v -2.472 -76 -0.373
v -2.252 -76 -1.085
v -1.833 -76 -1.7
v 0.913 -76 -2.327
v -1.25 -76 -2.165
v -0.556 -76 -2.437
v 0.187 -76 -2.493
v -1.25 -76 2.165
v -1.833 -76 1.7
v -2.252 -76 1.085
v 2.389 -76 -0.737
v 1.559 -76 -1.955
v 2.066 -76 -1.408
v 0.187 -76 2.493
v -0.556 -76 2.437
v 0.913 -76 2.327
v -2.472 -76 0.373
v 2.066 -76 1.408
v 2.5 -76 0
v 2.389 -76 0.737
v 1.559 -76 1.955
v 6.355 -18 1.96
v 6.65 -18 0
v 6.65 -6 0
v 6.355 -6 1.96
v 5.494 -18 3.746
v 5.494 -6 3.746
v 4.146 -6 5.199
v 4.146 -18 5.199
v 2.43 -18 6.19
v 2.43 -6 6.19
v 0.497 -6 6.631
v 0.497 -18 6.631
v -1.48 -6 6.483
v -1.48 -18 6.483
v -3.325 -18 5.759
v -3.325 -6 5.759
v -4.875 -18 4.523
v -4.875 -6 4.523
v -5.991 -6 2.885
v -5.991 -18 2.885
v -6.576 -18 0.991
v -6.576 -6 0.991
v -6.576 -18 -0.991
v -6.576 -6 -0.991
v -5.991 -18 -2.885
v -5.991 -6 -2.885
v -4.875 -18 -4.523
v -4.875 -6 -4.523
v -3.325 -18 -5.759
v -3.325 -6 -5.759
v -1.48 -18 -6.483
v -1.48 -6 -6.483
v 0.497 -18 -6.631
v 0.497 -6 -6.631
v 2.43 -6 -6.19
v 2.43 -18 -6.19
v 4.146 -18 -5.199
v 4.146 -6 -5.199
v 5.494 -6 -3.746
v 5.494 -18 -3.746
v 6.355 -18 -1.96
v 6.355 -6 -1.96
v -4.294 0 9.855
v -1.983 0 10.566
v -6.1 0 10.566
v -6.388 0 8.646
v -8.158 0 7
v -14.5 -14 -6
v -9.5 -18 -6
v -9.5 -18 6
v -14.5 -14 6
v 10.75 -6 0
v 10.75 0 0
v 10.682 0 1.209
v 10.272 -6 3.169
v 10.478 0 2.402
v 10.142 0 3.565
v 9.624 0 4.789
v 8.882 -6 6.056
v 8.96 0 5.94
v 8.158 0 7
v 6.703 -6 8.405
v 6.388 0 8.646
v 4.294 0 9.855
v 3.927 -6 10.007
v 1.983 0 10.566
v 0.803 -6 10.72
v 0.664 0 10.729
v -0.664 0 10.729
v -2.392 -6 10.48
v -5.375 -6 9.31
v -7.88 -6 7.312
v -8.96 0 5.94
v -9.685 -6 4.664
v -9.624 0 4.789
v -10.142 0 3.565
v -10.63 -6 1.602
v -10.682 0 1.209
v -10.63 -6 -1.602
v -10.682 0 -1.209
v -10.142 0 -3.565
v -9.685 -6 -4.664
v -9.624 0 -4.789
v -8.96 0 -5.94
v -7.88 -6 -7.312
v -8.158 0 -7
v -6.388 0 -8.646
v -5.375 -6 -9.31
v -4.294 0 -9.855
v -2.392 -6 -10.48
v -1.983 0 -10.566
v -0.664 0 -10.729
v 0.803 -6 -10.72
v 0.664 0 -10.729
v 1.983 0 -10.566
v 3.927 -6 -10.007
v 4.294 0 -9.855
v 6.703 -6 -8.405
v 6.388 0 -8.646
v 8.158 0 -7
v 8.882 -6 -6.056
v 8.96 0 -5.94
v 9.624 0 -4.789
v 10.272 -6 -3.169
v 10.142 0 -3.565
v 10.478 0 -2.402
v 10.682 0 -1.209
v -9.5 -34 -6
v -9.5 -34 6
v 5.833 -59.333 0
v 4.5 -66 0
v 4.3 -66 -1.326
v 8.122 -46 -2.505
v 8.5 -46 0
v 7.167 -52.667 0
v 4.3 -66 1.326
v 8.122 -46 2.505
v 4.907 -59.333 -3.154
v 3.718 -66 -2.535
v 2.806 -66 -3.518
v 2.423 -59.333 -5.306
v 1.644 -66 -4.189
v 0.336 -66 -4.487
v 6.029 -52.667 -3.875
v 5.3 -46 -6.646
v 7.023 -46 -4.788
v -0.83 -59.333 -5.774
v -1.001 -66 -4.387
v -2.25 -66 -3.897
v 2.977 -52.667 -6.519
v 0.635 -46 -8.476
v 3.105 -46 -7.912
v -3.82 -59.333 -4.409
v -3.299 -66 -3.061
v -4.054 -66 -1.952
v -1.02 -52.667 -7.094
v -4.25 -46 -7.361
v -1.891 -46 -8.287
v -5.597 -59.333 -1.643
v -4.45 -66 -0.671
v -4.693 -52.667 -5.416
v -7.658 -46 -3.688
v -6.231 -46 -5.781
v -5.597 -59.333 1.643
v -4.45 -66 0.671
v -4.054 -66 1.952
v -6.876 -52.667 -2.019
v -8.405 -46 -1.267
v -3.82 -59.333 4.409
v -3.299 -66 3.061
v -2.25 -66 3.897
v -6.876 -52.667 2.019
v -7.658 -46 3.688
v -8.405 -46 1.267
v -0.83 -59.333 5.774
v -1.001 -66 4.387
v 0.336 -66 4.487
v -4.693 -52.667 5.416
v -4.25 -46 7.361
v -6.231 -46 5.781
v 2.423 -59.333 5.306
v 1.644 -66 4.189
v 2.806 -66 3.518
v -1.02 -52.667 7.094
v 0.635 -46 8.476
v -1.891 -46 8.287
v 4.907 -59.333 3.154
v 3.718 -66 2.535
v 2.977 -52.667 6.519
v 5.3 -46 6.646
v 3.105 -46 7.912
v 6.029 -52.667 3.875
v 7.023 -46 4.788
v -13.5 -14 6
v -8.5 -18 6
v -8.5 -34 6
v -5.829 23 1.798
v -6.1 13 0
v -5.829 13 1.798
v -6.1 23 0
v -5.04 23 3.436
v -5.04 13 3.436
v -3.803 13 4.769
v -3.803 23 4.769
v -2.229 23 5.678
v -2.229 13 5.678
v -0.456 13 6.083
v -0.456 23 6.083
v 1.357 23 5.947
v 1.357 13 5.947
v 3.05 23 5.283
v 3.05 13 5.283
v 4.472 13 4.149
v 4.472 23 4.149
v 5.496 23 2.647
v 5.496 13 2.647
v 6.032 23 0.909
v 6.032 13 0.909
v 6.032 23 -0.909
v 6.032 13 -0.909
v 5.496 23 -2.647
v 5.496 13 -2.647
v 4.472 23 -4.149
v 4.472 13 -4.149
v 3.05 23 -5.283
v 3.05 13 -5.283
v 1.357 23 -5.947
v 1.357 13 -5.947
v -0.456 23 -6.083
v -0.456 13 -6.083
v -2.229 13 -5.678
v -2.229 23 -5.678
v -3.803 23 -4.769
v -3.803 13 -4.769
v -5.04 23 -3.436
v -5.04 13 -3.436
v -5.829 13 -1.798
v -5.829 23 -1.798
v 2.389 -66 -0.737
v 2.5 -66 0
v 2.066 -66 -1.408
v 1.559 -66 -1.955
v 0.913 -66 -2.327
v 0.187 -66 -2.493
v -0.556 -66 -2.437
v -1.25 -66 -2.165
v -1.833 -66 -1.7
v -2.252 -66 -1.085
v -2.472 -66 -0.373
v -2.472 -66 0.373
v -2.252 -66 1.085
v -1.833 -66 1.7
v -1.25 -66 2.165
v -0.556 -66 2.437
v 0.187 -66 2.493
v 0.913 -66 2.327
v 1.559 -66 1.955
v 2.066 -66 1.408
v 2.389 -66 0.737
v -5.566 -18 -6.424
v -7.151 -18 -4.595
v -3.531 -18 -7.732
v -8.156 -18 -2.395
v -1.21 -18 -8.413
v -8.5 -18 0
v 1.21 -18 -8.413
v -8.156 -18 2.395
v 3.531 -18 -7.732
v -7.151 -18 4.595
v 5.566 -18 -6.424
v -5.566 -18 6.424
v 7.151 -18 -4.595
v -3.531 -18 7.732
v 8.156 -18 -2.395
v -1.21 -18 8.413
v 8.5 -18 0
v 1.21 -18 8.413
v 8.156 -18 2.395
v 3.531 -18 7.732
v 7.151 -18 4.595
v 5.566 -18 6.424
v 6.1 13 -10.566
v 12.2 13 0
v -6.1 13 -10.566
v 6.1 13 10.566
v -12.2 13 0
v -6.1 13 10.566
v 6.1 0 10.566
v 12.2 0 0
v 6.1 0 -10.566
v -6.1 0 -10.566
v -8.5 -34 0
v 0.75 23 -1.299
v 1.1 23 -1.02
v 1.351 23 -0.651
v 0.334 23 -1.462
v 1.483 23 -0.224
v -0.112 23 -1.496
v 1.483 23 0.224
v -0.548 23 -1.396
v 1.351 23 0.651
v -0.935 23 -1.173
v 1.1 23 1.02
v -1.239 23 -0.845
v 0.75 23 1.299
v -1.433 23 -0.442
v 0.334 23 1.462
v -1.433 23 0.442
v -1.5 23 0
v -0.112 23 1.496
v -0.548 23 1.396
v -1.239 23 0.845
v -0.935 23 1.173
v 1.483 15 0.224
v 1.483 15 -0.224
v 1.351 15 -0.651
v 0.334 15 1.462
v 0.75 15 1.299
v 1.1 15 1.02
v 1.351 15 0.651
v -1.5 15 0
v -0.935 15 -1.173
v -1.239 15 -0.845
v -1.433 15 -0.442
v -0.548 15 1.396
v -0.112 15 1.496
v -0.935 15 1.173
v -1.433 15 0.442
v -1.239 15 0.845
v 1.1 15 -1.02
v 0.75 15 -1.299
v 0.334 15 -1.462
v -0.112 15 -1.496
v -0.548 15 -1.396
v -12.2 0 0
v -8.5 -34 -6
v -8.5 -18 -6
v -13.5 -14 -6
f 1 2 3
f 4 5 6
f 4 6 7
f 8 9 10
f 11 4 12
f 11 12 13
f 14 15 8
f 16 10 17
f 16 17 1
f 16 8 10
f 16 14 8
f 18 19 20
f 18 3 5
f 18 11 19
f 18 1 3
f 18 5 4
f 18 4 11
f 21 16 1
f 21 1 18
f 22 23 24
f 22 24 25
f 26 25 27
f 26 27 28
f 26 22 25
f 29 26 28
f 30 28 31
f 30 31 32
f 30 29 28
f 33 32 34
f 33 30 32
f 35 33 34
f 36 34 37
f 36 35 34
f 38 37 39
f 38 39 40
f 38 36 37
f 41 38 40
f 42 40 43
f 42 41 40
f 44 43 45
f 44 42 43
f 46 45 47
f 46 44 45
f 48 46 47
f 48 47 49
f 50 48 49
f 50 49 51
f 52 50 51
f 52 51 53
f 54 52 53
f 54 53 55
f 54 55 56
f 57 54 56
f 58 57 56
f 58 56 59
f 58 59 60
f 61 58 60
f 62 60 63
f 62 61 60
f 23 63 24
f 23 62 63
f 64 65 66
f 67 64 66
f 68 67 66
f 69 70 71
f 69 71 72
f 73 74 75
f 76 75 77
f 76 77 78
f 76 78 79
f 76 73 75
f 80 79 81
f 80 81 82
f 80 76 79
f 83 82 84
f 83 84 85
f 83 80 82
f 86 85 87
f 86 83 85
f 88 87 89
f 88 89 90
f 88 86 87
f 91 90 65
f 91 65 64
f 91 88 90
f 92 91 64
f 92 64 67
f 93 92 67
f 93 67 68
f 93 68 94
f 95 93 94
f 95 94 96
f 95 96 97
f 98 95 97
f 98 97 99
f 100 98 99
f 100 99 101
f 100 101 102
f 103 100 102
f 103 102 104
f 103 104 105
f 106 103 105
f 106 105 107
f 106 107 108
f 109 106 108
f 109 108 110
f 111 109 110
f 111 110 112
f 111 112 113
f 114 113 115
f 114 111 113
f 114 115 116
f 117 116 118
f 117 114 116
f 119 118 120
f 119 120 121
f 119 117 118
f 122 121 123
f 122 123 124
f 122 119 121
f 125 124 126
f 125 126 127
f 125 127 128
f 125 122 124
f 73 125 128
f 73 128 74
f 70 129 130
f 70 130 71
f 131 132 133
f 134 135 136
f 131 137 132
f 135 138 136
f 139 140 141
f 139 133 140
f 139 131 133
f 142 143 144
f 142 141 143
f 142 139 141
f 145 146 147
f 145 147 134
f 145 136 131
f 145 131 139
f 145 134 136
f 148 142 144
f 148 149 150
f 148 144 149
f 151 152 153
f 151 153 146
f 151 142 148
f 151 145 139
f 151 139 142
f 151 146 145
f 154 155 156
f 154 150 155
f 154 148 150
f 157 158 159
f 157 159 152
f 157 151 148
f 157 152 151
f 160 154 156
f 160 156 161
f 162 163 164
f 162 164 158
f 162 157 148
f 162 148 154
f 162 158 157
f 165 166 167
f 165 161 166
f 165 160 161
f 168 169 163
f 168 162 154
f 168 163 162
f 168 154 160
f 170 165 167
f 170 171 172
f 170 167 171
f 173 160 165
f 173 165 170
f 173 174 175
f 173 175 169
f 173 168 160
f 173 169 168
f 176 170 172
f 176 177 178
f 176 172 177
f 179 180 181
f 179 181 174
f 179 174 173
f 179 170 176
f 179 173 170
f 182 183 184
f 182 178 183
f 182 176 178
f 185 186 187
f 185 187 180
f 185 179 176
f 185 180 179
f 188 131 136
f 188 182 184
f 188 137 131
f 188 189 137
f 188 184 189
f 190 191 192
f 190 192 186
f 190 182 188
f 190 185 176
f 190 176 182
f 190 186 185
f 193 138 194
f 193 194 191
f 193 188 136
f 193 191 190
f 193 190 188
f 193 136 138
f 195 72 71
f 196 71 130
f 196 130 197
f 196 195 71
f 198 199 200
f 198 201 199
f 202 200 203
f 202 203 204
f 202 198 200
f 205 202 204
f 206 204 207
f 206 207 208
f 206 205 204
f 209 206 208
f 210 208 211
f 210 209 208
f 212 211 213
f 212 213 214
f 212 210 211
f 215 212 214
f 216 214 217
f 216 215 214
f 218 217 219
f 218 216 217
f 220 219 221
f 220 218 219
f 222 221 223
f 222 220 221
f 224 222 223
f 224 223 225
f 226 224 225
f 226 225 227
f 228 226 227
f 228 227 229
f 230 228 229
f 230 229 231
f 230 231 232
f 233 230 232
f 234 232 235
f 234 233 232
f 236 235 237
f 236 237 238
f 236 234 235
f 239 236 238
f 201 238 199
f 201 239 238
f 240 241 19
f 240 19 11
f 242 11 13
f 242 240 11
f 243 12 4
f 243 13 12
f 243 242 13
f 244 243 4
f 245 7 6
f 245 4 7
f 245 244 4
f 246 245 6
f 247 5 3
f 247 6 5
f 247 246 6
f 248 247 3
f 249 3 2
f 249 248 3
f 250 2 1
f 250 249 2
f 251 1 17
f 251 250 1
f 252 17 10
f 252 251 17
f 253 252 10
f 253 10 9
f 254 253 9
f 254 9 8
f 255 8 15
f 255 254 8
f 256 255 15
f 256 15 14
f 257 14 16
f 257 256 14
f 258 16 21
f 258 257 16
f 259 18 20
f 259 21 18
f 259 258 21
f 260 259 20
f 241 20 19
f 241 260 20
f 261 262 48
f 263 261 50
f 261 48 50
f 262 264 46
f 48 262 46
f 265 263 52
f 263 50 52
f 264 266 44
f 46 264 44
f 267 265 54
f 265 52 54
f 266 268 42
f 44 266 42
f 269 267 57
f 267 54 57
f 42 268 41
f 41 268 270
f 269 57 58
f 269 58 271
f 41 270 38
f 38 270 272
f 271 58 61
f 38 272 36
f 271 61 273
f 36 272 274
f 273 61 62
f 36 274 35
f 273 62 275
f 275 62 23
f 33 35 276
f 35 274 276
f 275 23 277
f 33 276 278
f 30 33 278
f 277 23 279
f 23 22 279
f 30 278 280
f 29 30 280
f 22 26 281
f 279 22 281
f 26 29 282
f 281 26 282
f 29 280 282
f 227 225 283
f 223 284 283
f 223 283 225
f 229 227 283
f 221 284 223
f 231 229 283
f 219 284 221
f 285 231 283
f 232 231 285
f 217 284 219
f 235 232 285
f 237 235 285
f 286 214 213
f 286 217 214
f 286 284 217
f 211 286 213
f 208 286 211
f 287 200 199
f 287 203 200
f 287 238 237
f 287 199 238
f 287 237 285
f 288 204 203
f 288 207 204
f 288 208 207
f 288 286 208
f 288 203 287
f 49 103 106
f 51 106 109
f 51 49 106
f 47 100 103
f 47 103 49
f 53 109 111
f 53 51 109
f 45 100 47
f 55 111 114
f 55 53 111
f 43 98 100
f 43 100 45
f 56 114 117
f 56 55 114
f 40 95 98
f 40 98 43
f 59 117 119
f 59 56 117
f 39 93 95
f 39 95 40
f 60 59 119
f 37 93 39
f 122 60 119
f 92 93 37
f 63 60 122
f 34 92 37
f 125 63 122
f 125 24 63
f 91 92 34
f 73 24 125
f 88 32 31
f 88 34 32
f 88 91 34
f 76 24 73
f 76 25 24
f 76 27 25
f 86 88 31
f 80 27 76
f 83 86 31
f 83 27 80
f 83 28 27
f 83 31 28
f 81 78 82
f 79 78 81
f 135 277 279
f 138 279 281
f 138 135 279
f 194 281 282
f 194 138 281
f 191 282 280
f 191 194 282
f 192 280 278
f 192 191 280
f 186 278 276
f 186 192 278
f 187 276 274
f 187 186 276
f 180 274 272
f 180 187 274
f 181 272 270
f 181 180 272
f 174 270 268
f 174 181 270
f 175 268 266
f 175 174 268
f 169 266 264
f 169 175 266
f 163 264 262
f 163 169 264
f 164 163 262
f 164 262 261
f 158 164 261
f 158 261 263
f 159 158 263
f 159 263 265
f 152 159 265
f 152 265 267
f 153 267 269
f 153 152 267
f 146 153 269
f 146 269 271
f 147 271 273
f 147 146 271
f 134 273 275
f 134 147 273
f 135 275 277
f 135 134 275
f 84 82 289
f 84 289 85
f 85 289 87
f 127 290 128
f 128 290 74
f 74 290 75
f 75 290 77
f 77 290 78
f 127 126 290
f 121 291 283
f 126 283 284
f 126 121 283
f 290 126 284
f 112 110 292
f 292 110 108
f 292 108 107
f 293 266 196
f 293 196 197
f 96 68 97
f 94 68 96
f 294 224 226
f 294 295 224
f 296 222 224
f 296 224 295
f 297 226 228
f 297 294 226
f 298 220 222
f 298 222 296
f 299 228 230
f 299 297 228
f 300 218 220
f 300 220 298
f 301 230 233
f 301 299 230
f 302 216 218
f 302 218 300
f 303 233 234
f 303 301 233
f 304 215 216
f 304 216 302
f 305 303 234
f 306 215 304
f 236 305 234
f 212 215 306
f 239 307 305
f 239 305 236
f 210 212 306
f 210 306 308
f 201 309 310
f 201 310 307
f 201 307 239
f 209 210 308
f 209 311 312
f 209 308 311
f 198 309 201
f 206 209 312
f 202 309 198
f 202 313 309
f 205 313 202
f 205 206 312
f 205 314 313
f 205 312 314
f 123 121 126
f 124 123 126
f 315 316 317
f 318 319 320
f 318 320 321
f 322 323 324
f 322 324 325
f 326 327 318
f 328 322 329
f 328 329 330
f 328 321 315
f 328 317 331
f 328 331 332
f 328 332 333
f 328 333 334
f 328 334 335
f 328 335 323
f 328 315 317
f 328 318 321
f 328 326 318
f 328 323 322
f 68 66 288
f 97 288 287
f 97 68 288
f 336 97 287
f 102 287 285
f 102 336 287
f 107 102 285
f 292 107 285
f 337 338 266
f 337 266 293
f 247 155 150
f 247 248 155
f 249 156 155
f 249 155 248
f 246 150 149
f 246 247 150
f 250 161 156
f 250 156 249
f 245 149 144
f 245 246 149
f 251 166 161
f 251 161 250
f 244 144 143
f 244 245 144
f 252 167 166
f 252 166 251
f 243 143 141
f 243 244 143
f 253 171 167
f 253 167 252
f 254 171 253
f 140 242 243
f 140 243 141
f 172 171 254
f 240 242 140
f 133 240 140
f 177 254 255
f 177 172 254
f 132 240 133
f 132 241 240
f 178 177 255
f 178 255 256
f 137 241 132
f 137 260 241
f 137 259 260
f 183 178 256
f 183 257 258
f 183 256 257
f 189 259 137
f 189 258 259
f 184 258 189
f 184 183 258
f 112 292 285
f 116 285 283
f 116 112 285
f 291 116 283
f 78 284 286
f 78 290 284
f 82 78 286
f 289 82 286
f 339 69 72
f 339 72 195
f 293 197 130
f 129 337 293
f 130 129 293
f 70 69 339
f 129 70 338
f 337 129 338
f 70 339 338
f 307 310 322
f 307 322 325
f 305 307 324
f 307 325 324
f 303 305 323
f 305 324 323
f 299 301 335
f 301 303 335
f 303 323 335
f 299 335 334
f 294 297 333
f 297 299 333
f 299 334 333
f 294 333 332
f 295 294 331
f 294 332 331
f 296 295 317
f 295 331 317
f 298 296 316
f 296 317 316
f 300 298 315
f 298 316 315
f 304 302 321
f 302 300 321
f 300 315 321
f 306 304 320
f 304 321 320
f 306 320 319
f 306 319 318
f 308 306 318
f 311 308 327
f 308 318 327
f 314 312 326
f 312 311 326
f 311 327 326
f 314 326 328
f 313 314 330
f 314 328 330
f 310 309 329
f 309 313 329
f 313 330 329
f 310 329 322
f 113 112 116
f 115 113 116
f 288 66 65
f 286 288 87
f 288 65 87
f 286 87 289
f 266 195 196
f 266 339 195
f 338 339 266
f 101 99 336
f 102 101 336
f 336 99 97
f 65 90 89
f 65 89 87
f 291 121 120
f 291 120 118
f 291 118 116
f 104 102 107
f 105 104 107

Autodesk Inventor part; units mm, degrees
ref_plane "YZ Plane" through (0, 0, 0) normal (1, 0, 0) x (0, 1, 0)
ref_plane "XZ Plane" through (0, 0, 0) normal (0, 1, 0) x (-1, 0, 0)
ref_plane "XY Plane" through (0, 0, 0) normal (0, 0, 1) x (1, 0, 0)
sketch "Sketch1" plane through (0, 0, 0) normal (0, 0, 1) x (1, 0, 0)
  line L0 (0, 13.8093) -> (0, -15.119)
  line L1 (0, 0) -> (10.75, 0)
  line L2 (10.75, 0) -> (10.75, -6)
  line L3 (10.75, -6) -> (6.65, -6)
  line L4 (6.65, -6) -> (6.65, -18)
  line L5 (6.65, -18) -> (8.5, -18)
  line L6 (8.5, -18) -> (8.5, -46)
  line L7 (8.5, -46) -> (4.5, -66)
  line L8 (4.5, -66) -> (0, -66)
  line L9 (0, -66) -> (0, 0)
  dimension "d0" = 10.75
  dimension "d1" = 6
  dimension "d2" = 4.1
  dimension "d3" = 12
  dimension "d4" = 28
  dimension "d5" = 1.85
  dimension "d6" = 20
  dimension "d7" = 4.5
revolve "body" add sketch "Sketch1" angle 360 about axis through (0, 13.8093, 0) along (0, -1, 0)
sketch "Sketch2" plane through (0, 0, 0) normal (0, 1, 0) x (-1, 0, 0)
  circle A0 centre (0, 0) radius 6.65 construction
  circle A1 centre (0, 0) radius 12.2 construction
  line L0 (6.1, -10.5655) -> (-6.1, -10.5655)
  line L1 (-6.1, -10.5655) -> (-12.2, 0)
  line L2 (12.2, 0) -> (-12.2, 0) construction
  line L3 (-12.2, 0) -> (-6.1, 10.5655)
  line L4 (6.1, 10.5655) -> (-6.1, 10.5655)
  line L5 (6.1, 10.5655) -> (12.2, 0)
  line L6 (12.2, 0) -> (6.1, -10.5655)
  point P0 (0, 0)
  dimension "d9" = 24.4
extrude "hexBit" add sketch "Sketch2" along normal blind 13
sketch "Sketch3" plane through (0, 0, 0) normal (0, 0, 1) x (1, 0, 0)
  line L0 (-6.1, 13) -> (6.1, 13) construction
  line L1 (-6.1, 13) -> (-6.1, 23)
  line L2 (-6.1, 23) -> (-1.5, 23)
  line L3 (-1.5, 23) -> (-1.5, 15)
  line L4 (6.1, 13) -> (-6.1, 13) projected
  line L5 (0, 13) -> (0, 41.9398)
  line L6 (-6.1, 13) -> (0, 13)
  line L7 (0, 13) -> (0, 15)
  line L8 (0, 15) -> (-1.5, 15)
  point P0 (0, 0)
  dimension "d12" = 10
  dimension "d14" = 8
  dimension "d17" = 1.5
revolve "sensorENtrance" add sketch "Sketch3" angle 360 about axis through (0, 13, 0) along (0, 1, 0)
thread "Thread1" size "M14x2" class "6g" standard "ANSI Metric M Profile" full length
sketch "Sketch5" plane through (0, 0, 0) normal (0, 0, 1) x (1, 0, 0)
  line L0 (-8.5, -46) -> (8.5, -46) construction
  line L1 (-8.5, -18) -> (8.5, -18) construction
  line L2 (-8.5, -34) -> (-9.5, -34)
  line L3 (-9.5, -34) -> (-9.5, -18)
  line L4 (-8.5, -18) -> (-8.5, -46) projected
  line L5 (-9.5, -18) -> (-14.5, -14)
  line L6 (-8.5, -18) -> (-8.5, -34)
  line L7 (-8.5, -18) -> (8.5, -18) projected
  line L8 (-13.5, -14) -> (-8.5, -18)
  line L9 (-14.5, -14) -> (-13.5, -14)
  point P0 (0, 0)
  dimension "d21" = 1
  dimension "d22" = 16
  dimension "d24" = 4
  dimension "d25" = 5
extrude "stickingOutBit" add sketch "Sketch5" along normal mid plane 12
sketch "Sketch6" plane through (0, -66, 0) normal (0, -1, 0) x (1, 0, 0)
  circle A0 centre (0, 0) radius 2.5
  dimension "d28" = 5
extrude "lead" add sketch "Sketch6" along normal blind 10
sketch "pinsPlacement" plane through (0, -76, 0) normal (0, -1, 0) x (1, 0, 0)
  line L0 (-1.2888, 0) -> (1.0188, 0) construction
  line L1 (0.5, 0.75) -> (0.5, -0.75) construction
  point P0 (0, 0)
  point P1 (-0.75, 0)
  point P2 (0.5, 0)
  dimension "d31" = 0.75
  dimension "d32" = 0.5
  dimension "d33" = 1.5
properties part number "30PSIPressureSensor"
